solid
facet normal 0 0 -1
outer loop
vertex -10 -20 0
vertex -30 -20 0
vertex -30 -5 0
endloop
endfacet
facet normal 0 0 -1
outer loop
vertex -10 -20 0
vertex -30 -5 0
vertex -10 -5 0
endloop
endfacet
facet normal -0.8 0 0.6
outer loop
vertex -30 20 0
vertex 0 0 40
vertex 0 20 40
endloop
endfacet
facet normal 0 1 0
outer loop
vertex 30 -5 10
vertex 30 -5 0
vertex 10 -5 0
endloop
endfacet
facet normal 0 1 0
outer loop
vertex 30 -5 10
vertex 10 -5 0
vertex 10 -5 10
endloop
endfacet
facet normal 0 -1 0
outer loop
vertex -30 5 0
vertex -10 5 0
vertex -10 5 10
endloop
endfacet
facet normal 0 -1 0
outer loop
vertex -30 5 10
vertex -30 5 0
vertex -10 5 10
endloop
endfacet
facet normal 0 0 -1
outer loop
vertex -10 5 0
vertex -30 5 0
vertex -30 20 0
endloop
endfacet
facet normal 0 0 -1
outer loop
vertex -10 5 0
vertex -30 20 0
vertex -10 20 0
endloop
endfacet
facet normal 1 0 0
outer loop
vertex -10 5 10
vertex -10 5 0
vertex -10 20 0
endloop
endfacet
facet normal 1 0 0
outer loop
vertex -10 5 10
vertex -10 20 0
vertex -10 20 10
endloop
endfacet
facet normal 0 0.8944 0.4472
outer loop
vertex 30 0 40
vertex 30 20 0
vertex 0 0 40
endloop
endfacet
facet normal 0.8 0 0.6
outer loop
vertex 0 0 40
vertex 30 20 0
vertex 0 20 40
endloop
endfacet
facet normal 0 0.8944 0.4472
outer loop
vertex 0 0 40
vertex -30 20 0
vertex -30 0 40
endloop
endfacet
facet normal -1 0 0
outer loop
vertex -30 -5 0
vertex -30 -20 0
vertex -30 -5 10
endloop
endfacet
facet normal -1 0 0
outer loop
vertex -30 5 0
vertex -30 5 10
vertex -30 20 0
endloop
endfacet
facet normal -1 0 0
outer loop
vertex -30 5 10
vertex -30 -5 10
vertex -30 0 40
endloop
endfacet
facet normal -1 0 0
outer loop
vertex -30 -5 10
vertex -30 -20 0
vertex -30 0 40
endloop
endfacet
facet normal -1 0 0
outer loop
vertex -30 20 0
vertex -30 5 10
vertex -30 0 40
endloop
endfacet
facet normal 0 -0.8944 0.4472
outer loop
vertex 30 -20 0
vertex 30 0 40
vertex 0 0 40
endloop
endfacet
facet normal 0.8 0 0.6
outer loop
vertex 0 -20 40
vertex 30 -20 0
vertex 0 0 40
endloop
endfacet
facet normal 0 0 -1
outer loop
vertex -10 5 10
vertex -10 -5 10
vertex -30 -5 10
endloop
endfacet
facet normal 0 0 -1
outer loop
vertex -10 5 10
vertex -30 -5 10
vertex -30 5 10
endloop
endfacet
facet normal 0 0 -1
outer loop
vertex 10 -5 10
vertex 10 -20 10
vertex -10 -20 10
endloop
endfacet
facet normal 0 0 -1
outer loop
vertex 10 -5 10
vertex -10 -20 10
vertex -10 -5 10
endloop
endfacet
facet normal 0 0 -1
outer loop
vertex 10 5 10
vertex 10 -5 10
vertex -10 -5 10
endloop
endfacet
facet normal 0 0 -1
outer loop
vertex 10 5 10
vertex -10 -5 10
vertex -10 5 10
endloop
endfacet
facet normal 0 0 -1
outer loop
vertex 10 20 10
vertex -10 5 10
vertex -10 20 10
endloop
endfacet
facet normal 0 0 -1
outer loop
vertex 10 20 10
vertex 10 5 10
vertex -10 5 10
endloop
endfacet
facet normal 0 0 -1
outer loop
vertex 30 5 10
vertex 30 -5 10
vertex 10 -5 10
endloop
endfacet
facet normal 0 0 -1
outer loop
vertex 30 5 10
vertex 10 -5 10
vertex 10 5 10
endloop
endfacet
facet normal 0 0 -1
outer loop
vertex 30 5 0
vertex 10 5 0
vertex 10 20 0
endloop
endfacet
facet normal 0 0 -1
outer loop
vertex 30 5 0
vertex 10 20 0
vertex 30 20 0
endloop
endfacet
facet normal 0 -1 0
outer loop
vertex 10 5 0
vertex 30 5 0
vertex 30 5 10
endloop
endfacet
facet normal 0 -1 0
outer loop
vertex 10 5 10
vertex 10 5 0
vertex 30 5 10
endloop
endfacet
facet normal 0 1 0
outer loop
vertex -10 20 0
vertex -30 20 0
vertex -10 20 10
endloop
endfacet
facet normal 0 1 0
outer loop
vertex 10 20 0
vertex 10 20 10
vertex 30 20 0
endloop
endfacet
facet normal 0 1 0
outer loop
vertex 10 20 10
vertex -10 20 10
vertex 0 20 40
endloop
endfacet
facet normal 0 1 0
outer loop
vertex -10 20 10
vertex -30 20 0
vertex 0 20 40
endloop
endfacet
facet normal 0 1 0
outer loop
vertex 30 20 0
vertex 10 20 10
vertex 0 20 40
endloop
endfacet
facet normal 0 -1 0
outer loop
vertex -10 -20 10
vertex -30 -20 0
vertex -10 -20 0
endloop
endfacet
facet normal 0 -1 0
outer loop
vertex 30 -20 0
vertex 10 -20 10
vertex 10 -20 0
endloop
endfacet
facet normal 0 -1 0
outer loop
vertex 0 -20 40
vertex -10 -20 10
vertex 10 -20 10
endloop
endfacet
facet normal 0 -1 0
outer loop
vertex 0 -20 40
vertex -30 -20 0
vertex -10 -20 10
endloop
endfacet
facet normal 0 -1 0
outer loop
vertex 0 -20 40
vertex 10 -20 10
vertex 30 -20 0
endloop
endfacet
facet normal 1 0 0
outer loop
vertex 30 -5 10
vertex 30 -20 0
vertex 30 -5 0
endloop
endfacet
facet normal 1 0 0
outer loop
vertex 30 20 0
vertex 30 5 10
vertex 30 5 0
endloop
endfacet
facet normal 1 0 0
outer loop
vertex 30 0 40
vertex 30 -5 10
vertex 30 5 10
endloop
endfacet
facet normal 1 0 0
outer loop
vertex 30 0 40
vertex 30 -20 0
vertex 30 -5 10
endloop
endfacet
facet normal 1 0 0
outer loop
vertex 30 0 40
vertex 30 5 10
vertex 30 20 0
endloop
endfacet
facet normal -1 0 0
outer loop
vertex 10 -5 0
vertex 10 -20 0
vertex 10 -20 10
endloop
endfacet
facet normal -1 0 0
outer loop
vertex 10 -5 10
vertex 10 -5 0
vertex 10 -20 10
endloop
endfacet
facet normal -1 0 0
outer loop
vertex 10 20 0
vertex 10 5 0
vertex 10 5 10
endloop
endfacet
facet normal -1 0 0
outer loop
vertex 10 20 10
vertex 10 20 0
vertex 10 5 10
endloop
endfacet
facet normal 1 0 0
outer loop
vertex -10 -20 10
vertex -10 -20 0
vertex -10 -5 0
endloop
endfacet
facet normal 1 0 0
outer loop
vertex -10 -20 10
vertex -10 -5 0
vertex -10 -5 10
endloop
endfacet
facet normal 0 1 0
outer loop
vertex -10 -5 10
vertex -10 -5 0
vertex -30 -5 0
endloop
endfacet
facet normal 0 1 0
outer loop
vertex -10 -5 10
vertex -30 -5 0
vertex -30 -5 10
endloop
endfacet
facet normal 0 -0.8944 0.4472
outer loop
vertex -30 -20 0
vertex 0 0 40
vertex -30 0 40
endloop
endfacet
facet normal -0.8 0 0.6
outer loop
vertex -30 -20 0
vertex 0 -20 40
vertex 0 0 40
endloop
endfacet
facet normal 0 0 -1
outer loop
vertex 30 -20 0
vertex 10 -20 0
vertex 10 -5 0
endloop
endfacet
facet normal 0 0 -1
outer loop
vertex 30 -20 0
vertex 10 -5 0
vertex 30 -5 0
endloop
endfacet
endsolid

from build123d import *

# Parameters (mm, degrees)
F1_DEPTH = 20
F3_DEPTH = 30
F4_W     = 20
F4_H     = 10
F5_DEPTH = 40
F6_W     = 10
F6_H     = 10
F7_DEPTH = 64.9


with BuildPart() as f1:
    # F0 (on Front) → F1 (new body, symmetric)
    with BuildSketch(Plane.XZ):
        Polygon((0, 40), (-30, 0), (30, 0), align=None)
    extrude(amount=F1_DEPTH, both=True)

    # F2 (on Right) → F3 (join, symmetric)
    with BuildSketch(Plane.YZ):
        Polygon((20, 0), (0, 40), (-20, 0), align=None)
    extrude(amount=F3_DEPTH, both=True)

    # F4 (on face) → F5 (cut, through all)
    with BuildSketch(Plane.XZ.offset(20)):
        with Locations((0, 5)):
            Rectangle(F4_W, F4_H)
    extrude(amount=-F5_DEPTH, mode=Mode.SUBTRACT)

    # F6 (on face) → F7 (cut)
    with BuildSketch(Plane.YZ.offset(30)):
        with Locations((0, 5)):
            Rectangle(F6_W, F6_H)
    extrude(amount=-F7_DEPTH, mode=Mode.SUBTRACT)


solid = f1.part
